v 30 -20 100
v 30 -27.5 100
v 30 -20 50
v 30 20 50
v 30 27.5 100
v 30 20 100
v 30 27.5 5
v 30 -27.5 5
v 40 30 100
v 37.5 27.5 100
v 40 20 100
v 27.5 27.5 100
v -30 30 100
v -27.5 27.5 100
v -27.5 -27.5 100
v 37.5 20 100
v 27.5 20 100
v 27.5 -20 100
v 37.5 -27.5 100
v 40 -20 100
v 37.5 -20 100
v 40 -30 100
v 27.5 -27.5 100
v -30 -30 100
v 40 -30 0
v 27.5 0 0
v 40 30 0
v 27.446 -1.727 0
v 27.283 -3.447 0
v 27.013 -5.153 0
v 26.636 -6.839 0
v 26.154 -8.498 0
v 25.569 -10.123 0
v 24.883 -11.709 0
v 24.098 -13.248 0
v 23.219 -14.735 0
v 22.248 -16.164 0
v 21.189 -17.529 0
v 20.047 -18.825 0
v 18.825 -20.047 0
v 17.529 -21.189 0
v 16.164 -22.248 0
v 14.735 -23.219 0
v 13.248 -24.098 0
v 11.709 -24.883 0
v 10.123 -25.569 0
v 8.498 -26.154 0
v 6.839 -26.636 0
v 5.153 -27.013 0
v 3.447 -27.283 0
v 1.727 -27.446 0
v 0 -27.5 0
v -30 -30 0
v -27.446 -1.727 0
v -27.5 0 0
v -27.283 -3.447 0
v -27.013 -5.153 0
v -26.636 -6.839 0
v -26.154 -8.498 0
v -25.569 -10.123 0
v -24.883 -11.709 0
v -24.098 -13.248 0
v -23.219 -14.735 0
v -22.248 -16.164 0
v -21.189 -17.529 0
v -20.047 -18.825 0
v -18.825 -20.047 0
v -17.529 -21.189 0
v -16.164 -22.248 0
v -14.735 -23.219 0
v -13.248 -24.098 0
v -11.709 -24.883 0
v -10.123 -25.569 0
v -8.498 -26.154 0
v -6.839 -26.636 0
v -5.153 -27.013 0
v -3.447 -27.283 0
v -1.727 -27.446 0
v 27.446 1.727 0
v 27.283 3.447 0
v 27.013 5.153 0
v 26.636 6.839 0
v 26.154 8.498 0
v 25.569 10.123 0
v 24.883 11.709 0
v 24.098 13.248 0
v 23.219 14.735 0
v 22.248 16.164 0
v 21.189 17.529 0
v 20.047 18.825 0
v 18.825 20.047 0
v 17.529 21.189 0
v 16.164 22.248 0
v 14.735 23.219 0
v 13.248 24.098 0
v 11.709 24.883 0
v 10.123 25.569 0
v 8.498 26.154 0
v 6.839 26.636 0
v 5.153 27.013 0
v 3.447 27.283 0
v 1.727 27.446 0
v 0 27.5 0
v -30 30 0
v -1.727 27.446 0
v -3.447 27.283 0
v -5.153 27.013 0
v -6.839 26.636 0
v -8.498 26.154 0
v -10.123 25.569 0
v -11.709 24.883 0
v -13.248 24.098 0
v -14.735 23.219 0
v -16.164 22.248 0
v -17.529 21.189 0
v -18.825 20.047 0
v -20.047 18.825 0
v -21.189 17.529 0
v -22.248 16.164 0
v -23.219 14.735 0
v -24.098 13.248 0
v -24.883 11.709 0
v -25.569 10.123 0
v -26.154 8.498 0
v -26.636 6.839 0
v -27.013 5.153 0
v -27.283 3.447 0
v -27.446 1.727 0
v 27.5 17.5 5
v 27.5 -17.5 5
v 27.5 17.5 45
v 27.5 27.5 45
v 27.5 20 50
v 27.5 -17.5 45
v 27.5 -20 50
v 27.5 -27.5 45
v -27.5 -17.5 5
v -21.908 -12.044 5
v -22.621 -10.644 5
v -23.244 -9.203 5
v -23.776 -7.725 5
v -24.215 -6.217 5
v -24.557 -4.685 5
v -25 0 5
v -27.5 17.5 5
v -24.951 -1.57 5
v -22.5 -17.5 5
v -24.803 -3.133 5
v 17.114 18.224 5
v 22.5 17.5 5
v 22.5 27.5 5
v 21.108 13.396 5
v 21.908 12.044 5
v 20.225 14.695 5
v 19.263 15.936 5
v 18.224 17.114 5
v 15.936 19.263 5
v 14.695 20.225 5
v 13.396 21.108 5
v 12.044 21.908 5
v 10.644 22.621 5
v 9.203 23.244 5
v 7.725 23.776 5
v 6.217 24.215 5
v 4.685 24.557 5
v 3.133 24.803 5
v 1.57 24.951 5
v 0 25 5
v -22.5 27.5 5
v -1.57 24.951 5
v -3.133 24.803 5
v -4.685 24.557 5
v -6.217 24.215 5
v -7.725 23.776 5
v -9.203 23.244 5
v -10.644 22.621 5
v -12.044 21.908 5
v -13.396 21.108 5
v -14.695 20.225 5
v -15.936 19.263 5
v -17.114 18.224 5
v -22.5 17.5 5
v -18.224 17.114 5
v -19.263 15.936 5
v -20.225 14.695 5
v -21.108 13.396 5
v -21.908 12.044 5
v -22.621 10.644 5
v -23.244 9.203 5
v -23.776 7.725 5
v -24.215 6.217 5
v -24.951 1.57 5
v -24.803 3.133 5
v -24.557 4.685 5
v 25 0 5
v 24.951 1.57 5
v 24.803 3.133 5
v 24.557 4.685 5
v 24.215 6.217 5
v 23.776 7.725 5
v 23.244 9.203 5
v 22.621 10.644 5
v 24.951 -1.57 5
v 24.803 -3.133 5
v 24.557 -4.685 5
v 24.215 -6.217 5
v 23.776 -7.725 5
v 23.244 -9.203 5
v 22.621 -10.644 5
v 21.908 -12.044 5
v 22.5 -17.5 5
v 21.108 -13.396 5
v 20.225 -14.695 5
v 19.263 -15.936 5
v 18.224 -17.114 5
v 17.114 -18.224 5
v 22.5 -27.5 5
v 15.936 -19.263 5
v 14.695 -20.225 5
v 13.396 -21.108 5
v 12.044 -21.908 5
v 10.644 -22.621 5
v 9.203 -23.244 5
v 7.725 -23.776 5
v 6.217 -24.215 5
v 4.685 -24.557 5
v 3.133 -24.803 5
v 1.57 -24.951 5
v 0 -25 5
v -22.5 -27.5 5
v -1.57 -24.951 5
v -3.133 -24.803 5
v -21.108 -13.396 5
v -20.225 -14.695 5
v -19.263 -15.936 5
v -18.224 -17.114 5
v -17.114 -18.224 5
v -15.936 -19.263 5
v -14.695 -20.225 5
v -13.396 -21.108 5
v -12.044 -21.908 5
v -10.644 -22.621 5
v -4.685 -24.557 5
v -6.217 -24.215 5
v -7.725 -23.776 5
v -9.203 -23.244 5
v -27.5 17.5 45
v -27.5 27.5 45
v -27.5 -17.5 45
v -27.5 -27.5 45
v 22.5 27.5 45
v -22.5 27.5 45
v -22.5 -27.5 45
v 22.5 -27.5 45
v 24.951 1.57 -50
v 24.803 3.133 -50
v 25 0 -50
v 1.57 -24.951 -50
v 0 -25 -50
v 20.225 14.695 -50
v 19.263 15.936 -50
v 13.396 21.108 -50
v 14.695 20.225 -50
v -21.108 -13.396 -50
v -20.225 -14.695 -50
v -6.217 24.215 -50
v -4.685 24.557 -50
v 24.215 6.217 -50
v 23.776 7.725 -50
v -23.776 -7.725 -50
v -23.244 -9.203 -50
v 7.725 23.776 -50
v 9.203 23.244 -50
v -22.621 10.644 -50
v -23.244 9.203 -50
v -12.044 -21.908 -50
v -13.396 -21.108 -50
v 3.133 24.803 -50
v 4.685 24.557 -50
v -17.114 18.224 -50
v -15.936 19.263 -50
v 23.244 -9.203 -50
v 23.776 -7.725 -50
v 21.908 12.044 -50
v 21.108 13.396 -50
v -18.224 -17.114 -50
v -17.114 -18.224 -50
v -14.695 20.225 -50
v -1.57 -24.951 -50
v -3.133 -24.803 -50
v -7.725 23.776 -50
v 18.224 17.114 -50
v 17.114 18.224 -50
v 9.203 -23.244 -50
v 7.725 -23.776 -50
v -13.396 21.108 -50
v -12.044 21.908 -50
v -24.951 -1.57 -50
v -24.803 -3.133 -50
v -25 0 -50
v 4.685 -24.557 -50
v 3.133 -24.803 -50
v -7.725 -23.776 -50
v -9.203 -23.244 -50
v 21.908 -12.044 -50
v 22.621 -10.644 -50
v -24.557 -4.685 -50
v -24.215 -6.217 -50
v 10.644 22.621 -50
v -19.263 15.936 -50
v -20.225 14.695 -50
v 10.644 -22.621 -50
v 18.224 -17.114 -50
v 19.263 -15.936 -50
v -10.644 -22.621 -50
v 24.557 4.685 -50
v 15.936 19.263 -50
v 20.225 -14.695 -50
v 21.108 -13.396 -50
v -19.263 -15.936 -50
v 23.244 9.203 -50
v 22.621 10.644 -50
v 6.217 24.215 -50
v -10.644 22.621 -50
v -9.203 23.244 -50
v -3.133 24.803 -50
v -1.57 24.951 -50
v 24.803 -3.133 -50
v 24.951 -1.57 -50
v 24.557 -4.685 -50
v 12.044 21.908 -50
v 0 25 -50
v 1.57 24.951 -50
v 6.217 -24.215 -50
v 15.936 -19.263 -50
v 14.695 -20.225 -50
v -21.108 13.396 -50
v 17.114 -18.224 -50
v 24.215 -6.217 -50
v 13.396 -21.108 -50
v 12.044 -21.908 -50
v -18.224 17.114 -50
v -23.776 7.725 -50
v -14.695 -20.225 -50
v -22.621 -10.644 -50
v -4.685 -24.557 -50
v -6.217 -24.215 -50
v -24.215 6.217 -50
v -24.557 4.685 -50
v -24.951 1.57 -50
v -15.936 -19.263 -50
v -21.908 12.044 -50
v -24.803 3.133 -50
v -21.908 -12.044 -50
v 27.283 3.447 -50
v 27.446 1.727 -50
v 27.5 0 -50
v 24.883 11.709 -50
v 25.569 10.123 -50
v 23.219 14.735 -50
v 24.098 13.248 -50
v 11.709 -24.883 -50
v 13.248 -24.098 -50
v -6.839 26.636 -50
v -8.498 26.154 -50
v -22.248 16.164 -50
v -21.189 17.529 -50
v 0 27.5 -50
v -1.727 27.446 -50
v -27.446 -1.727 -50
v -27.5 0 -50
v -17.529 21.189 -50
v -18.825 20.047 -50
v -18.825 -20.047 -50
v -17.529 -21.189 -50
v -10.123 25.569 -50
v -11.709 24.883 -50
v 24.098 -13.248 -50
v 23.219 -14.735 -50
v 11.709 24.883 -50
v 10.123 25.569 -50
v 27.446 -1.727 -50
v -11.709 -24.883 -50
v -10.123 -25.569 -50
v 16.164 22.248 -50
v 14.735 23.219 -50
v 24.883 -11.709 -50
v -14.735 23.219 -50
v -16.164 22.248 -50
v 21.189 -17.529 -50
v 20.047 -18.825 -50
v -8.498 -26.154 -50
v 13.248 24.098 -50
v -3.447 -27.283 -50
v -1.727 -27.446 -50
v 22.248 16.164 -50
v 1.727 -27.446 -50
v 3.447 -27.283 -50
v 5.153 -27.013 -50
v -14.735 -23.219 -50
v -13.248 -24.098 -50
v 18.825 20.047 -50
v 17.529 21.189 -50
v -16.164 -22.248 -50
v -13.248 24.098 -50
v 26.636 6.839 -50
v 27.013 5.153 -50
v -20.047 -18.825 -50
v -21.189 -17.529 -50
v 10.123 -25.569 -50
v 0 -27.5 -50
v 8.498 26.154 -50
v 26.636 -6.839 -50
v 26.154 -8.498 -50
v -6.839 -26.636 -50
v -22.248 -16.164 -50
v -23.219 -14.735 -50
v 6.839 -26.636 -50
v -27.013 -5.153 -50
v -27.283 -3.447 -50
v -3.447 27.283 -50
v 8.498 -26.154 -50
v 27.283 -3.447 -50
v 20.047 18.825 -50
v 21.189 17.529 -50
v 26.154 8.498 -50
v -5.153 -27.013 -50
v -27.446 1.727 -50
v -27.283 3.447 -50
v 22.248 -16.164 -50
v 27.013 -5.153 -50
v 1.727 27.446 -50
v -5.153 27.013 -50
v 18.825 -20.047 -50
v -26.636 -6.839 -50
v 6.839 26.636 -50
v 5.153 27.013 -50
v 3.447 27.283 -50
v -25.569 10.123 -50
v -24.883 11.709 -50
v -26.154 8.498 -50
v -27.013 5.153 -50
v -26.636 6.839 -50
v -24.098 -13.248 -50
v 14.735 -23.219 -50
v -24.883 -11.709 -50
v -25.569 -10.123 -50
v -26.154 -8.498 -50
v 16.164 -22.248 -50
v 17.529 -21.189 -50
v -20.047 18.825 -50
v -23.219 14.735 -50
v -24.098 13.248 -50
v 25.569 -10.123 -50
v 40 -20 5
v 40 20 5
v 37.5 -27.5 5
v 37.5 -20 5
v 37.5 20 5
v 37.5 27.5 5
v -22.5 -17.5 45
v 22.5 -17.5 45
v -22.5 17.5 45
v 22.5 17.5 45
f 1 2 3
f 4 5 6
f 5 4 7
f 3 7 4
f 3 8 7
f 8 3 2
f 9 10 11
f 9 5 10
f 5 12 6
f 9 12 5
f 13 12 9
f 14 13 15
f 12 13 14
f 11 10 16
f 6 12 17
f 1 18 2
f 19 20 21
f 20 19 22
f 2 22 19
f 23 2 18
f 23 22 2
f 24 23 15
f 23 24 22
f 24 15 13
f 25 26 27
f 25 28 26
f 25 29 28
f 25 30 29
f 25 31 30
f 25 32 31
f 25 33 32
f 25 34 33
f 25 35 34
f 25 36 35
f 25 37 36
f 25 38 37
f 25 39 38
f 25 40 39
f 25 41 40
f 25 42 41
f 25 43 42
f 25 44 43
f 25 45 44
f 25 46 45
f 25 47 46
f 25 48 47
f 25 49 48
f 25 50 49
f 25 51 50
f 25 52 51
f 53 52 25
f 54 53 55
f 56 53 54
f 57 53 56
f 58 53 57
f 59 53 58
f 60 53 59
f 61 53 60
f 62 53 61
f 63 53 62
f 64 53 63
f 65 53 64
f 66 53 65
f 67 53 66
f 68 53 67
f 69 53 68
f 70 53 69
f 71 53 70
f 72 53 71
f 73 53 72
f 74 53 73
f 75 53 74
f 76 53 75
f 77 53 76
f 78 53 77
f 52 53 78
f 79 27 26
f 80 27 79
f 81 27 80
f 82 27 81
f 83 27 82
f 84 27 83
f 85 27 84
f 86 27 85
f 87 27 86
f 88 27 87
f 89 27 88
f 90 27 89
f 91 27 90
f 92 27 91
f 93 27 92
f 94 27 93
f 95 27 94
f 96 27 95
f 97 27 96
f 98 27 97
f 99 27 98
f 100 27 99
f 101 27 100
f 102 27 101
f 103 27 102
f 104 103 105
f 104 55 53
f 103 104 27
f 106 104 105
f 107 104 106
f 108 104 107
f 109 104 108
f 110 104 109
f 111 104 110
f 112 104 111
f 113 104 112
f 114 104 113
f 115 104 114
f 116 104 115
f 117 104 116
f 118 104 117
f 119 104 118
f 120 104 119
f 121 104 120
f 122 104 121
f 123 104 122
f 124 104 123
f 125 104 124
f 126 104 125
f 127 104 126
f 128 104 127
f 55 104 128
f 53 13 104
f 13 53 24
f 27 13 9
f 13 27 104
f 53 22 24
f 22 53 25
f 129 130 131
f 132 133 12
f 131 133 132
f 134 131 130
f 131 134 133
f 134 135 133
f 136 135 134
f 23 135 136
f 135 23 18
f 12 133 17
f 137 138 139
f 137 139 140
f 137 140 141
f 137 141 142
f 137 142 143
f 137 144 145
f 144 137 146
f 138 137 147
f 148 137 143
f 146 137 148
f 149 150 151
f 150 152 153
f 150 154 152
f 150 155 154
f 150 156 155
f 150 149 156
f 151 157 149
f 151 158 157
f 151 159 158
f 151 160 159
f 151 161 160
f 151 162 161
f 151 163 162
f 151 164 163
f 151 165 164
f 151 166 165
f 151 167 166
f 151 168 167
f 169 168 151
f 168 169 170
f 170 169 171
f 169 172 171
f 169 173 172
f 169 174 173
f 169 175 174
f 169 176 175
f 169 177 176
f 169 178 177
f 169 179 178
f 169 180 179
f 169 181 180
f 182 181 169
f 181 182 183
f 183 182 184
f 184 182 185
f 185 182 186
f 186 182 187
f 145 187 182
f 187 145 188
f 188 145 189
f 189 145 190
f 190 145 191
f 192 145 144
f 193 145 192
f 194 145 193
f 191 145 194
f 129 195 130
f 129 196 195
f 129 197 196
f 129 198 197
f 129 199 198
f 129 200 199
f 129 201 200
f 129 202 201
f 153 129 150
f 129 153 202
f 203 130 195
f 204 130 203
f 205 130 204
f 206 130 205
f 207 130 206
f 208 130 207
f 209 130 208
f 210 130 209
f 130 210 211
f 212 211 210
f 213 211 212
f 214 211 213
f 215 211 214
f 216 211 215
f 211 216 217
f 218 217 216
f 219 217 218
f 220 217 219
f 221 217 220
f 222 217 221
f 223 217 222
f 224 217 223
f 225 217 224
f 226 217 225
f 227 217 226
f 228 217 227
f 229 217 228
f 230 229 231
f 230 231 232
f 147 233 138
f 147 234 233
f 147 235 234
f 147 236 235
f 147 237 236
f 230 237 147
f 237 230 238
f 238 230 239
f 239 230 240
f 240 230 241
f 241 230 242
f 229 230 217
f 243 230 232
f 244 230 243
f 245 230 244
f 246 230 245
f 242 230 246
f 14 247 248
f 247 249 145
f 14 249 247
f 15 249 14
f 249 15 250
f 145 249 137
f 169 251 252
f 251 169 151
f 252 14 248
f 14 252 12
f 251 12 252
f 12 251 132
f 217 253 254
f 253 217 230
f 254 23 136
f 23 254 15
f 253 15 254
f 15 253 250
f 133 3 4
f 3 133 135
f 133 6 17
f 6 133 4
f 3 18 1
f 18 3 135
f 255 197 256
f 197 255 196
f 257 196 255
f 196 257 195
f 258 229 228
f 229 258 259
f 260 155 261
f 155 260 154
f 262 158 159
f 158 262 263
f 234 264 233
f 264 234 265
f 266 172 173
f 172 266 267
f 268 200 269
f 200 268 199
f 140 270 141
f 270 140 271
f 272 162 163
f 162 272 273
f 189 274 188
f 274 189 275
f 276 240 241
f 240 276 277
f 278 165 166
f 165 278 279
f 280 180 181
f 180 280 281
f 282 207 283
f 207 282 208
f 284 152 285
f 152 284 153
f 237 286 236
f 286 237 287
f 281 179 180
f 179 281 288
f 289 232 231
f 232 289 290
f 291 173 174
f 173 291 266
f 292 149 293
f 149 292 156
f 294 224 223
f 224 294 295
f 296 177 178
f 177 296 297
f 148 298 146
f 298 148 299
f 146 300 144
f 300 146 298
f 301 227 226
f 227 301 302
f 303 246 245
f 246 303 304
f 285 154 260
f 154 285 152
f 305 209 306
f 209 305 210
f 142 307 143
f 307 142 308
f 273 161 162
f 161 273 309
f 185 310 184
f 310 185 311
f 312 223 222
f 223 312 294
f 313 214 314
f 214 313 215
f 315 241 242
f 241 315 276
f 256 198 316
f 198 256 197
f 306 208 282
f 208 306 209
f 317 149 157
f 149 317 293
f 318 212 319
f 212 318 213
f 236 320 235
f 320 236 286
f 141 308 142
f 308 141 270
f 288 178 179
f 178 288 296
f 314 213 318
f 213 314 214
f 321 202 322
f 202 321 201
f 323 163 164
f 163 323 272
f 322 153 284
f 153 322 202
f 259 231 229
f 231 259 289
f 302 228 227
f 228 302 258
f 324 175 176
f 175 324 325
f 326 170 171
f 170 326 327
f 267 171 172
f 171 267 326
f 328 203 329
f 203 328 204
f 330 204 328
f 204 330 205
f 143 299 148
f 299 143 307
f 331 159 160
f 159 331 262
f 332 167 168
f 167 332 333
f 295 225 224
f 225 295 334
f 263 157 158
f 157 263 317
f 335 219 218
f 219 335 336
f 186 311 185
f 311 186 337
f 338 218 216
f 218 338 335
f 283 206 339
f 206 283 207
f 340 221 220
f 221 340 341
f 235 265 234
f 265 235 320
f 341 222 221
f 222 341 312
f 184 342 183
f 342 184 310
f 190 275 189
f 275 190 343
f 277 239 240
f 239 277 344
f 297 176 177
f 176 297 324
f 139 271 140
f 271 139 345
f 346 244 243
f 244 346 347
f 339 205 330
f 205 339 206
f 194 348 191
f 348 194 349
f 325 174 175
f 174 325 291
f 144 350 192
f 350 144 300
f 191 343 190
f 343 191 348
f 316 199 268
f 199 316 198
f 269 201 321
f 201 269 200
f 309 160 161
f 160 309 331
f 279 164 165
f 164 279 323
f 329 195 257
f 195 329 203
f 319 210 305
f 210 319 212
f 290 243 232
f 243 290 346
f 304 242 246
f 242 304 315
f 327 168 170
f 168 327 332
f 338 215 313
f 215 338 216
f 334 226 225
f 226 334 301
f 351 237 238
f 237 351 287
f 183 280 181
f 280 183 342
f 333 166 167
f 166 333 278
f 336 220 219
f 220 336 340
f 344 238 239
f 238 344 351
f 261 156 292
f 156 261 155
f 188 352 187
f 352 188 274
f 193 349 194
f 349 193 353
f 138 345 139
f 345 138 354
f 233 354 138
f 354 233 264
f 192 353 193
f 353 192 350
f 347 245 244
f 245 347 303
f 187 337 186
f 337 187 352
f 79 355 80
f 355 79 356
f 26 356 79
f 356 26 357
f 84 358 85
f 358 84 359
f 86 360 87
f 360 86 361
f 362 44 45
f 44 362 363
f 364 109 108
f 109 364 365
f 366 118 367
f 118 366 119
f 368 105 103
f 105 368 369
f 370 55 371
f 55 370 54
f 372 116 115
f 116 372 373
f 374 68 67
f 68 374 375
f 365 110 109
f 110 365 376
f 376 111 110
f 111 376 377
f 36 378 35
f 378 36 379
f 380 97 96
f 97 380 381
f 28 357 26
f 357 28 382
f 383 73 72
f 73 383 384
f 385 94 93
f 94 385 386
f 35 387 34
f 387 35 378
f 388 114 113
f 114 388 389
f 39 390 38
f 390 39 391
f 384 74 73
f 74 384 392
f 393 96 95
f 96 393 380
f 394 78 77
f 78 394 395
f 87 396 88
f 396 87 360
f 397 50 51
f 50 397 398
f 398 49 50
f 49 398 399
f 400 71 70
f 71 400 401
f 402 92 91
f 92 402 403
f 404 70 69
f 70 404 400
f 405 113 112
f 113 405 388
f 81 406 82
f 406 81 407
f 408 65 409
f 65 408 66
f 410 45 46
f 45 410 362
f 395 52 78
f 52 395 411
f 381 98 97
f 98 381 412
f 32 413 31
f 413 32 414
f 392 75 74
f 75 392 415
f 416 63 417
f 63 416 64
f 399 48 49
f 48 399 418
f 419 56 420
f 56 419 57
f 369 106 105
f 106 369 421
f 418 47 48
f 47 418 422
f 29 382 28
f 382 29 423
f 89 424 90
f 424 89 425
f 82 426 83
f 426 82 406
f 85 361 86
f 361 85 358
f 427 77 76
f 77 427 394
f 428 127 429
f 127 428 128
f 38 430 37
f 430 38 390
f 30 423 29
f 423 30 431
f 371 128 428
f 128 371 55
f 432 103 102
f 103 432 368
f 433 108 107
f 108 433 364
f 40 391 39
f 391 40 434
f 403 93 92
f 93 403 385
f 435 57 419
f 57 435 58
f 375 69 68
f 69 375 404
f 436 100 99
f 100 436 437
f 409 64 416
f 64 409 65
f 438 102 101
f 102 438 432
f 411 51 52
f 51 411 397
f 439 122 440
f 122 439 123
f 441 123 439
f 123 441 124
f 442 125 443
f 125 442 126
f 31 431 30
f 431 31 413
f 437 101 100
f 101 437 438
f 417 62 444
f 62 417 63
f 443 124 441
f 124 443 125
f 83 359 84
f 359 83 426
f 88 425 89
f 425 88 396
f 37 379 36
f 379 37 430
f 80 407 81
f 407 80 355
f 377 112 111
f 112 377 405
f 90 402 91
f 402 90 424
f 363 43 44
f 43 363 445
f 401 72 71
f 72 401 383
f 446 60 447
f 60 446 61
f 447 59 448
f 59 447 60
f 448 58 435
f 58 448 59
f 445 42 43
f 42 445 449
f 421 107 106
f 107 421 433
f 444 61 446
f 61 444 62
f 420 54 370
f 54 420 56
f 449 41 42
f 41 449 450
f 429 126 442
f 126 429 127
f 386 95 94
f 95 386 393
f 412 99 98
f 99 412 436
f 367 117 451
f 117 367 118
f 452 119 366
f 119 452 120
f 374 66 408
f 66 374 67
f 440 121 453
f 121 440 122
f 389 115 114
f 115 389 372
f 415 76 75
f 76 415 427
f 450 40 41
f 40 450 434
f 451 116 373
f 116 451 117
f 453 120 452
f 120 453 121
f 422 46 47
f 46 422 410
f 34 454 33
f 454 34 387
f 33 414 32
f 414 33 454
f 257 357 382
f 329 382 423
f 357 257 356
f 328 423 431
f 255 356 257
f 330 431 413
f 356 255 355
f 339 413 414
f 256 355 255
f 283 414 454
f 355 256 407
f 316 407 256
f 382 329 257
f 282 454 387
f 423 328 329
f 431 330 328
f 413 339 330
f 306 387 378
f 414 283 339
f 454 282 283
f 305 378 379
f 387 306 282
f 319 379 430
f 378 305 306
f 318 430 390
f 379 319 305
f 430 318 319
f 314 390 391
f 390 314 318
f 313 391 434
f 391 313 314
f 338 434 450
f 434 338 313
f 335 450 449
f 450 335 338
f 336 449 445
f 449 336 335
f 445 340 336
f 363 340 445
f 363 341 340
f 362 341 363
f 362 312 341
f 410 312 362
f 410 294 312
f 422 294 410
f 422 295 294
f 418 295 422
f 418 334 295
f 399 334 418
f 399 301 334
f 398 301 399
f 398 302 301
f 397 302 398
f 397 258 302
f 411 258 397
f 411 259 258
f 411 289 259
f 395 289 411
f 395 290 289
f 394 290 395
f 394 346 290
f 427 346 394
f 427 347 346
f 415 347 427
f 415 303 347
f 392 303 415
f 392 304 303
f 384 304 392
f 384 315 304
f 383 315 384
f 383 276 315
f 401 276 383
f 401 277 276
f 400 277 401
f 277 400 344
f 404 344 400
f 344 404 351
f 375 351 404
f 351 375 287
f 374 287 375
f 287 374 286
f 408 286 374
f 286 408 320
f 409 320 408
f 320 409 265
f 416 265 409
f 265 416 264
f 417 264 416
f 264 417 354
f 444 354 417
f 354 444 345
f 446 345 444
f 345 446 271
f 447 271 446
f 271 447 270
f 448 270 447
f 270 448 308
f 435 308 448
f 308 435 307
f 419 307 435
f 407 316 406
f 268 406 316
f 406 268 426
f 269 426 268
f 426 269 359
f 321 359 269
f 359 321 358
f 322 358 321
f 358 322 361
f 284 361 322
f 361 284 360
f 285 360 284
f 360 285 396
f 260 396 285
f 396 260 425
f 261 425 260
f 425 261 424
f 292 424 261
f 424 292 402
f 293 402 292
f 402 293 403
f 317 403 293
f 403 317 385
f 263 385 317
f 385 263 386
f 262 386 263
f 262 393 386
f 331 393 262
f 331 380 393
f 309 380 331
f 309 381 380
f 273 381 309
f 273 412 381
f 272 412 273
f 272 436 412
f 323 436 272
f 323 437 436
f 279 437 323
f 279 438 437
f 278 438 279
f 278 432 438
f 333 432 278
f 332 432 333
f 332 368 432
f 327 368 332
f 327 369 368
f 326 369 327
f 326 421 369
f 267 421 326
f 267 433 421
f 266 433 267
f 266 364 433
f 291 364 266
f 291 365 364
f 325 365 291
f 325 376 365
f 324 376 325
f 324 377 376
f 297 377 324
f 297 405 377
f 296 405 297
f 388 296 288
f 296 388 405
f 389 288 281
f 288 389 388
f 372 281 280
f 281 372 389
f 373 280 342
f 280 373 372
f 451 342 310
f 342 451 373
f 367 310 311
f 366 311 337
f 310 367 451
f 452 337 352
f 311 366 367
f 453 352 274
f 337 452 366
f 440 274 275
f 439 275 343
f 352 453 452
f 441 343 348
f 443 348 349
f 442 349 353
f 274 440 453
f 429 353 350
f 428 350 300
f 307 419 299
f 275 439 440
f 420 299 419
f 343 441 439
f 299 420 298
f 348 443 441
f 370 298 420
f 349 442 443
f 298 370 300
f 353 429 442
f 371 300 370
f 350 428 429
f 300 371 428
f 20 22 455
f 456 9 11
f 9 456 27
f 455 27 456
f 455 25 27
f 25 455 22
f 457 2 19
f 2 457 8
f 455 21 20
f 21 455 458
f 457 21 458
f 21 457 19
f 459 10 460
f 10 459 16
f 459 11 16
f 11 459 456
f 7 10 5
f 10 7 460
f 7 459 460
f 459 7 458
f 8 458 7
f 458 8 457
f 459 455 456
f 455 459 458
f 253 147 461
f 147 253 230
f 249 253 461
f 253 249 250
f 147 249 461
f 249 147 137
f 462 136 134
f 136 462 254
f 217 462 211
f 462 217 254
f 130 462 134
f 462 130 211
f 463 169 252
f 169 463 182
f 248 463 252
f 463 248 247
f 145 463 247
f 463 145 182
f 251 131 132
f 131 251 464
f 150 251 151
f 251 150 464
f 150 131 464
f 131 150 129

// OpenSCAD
difference(){
   union(){
      difference(){
         difference(){
            translate( [ -30.000000, 0.000000, 0.000000 ] ){
               translate( [ 0.000000, -30.000000, 0.000000 ] ){
                  difference(){
                     cube( [ 60.000000, 60.000000, 100.000000 ] );
                     translate( [ 0.000000, 0.000000, 5.000000 ] ){
                        translate( [ 2.500000, 0.000000, 0.000000 ] ){
                           translate( [ 0.000000, 2.500000, 0.000000 ] ){
                              cube( [ 55.000000, 55.000000, 95.000000 ] );
                           }
                        }
                     }
                  }
               }
            }
            translate( [ 0.000000, 0.000000, 50.000000 ] ){
               translate( [ 25.000000, 0.000000, 0.000000 ] ){
                  translate( [ 0.000000, -20.000000, 0.000000 ] ){
                     cube( [ 5.000000, 40.000000, 50.000000 ] );
                  }
               }
            }
         }
         translate( [ 0.000000, 0.000000, -25.000000 ] ){
            cylinder( h=50.000000, r=25.000000, $fn=100 );
         }
      }translate( [ 0.000000, 0.000000, -50.000000 ] ){
         difference(){
            cylinder( h=50.000000, r=27.500000, $fn=100 );
            cylinder( h=50.000000, r=25.000000, $fn=100 );
         }
      }translate( [ 40.000000, 0.000000, 0.000000 ] ){
         translate( [ 0.000000, -27.500000, 0.000000 ] ){
            rotate( [ 0.000000, 0.000000, 90.000000 ] ){
               union(){
                  rotate( [ 0.000000, 0.000000, 90.000000 ] ){
                     cube( [ 10.000000, 2.500000, 100.000000 ] );
                  }translate( [ -2.500000, 0.000000, 0.000000 ] ){
                     cube( [ 10.000000, 2.500000, 100.000000 ] );
                  }
               }
            }
         }
      }translate( [ 0.000000, 30.000000, 0.000000 ] ){
         translate( [ 37.500000, 0.000000, 0.000000 ] ){
            rotate( [ 0.000000, 0.000000, 180.000000 ] ){
               union(){
                  rotate( [ 0.000000, 0.000000, 90.000000 ] ){
                     cube( [ 10.000000, 2.500000, 100.000000 ] );
                  }translate( [ -2.500000, 0.000000, 0.000000 ] ){
                     cube( [ 10.000000, 2.500000, 100.000000 ] );
                  }
               }
            }
         }
      }translate( [ 30.000000, -30.000000, 0.000000 ] ){
         cube( [ 10.000000, 60.000000, 5.000000 ] );
      }translate( [ -27.500000, -27.500000, 0.000000 ] ){
         cube( [ 5.000000, 10.000000, 45.000000 ] );
      }translate( [ 22.500000, -27.500000, 0.000000 ] ){
         cube( [ 5.000000, 10.000000, 45.000000 ] );
      }translate( [ -27.500000, 17.500000, 0.000000 ] ){
         cube( [ 5.000000, 10.000000, 45.000000 ] );
      }translate( [ 22.500000, 17.500000, 0.000000 ] ){
         cube( [ 5.000000, 10.000000, 45.000000 ] );
      }
   }
   union(){
      union(){
         union(){
            translate( [ -30.000000, 0.000000, 0.000000 ] ){
               translate( [ 0.000000, -30.000000, 0.000000 ] ){
                  union(){
                     translate( [ 0.000000, 0.000000, 5.000000 ] ){
                        translate( [ 2.500000, 0.000000, 0.000000 ] ){
                           translate( [ 0.000000, 2.500000, 0.000000 ] ){
                           }
                        }
                     }
                  }
               }
            }
            translate( [ 0.000000, 0.000000, 50.000000 ] ){
               translate( [ 25.000000, 0.000000, 0.000000 ] ){
                  translate( [ 0.000000, -20.000000, 0.000000 ] ){
                  }
               }
            }
         }
         translate( [ 0.000000, 0.000000, -25.000000 ] ){
         }
      }translate( [ 0.000000, 0.000000, -50.000000 ] ){
         union(){
         }
      }translate( [ 40.000000, 0.000000, 0.000000 ] ){
         translate( [ 0.000000, -27.500000, 0.000000 ] ){
            rotate( [ 0.000000, 0.000000, 90.000000 ] ){
               union(){
                  rotate( [ 0.000000, 0.000000, 90.000000 ] ){
                  }translate( [ -2.500000, 0.000000, 0.000000 ] ){
                  }
               }
            }
         }
      }translate( [ 0.000000, 30.000000, 0.000000 ] ){
         translate( [ 37.500000, 0.000000, 0.000000 ] ){
            rotate( [ 0.000000, 0.000000, 180.000000 ] ){
               union(){
                  rotate( [ 0.000000, 0.000000, 90.000000 ] ){
                  }translate( [ -2.500000, 0.000000, 0.000000 ] ){
                  }
               }
            }
         }
      }translate( [ 30.000000, -30.000000, 0.000000 ] ){
      }translate( [ -27.500000, -27.500000, 0.000000 ] ){
      }translate( [ 22.500000, -27.500000, 0.000000 ] ){
      }translate( [ -27.500000, 17.500000, 0.000000 ] ){
      }translate( [ 22.500000, 17.500000, 0.000000 ] ){
      }
   }
}
